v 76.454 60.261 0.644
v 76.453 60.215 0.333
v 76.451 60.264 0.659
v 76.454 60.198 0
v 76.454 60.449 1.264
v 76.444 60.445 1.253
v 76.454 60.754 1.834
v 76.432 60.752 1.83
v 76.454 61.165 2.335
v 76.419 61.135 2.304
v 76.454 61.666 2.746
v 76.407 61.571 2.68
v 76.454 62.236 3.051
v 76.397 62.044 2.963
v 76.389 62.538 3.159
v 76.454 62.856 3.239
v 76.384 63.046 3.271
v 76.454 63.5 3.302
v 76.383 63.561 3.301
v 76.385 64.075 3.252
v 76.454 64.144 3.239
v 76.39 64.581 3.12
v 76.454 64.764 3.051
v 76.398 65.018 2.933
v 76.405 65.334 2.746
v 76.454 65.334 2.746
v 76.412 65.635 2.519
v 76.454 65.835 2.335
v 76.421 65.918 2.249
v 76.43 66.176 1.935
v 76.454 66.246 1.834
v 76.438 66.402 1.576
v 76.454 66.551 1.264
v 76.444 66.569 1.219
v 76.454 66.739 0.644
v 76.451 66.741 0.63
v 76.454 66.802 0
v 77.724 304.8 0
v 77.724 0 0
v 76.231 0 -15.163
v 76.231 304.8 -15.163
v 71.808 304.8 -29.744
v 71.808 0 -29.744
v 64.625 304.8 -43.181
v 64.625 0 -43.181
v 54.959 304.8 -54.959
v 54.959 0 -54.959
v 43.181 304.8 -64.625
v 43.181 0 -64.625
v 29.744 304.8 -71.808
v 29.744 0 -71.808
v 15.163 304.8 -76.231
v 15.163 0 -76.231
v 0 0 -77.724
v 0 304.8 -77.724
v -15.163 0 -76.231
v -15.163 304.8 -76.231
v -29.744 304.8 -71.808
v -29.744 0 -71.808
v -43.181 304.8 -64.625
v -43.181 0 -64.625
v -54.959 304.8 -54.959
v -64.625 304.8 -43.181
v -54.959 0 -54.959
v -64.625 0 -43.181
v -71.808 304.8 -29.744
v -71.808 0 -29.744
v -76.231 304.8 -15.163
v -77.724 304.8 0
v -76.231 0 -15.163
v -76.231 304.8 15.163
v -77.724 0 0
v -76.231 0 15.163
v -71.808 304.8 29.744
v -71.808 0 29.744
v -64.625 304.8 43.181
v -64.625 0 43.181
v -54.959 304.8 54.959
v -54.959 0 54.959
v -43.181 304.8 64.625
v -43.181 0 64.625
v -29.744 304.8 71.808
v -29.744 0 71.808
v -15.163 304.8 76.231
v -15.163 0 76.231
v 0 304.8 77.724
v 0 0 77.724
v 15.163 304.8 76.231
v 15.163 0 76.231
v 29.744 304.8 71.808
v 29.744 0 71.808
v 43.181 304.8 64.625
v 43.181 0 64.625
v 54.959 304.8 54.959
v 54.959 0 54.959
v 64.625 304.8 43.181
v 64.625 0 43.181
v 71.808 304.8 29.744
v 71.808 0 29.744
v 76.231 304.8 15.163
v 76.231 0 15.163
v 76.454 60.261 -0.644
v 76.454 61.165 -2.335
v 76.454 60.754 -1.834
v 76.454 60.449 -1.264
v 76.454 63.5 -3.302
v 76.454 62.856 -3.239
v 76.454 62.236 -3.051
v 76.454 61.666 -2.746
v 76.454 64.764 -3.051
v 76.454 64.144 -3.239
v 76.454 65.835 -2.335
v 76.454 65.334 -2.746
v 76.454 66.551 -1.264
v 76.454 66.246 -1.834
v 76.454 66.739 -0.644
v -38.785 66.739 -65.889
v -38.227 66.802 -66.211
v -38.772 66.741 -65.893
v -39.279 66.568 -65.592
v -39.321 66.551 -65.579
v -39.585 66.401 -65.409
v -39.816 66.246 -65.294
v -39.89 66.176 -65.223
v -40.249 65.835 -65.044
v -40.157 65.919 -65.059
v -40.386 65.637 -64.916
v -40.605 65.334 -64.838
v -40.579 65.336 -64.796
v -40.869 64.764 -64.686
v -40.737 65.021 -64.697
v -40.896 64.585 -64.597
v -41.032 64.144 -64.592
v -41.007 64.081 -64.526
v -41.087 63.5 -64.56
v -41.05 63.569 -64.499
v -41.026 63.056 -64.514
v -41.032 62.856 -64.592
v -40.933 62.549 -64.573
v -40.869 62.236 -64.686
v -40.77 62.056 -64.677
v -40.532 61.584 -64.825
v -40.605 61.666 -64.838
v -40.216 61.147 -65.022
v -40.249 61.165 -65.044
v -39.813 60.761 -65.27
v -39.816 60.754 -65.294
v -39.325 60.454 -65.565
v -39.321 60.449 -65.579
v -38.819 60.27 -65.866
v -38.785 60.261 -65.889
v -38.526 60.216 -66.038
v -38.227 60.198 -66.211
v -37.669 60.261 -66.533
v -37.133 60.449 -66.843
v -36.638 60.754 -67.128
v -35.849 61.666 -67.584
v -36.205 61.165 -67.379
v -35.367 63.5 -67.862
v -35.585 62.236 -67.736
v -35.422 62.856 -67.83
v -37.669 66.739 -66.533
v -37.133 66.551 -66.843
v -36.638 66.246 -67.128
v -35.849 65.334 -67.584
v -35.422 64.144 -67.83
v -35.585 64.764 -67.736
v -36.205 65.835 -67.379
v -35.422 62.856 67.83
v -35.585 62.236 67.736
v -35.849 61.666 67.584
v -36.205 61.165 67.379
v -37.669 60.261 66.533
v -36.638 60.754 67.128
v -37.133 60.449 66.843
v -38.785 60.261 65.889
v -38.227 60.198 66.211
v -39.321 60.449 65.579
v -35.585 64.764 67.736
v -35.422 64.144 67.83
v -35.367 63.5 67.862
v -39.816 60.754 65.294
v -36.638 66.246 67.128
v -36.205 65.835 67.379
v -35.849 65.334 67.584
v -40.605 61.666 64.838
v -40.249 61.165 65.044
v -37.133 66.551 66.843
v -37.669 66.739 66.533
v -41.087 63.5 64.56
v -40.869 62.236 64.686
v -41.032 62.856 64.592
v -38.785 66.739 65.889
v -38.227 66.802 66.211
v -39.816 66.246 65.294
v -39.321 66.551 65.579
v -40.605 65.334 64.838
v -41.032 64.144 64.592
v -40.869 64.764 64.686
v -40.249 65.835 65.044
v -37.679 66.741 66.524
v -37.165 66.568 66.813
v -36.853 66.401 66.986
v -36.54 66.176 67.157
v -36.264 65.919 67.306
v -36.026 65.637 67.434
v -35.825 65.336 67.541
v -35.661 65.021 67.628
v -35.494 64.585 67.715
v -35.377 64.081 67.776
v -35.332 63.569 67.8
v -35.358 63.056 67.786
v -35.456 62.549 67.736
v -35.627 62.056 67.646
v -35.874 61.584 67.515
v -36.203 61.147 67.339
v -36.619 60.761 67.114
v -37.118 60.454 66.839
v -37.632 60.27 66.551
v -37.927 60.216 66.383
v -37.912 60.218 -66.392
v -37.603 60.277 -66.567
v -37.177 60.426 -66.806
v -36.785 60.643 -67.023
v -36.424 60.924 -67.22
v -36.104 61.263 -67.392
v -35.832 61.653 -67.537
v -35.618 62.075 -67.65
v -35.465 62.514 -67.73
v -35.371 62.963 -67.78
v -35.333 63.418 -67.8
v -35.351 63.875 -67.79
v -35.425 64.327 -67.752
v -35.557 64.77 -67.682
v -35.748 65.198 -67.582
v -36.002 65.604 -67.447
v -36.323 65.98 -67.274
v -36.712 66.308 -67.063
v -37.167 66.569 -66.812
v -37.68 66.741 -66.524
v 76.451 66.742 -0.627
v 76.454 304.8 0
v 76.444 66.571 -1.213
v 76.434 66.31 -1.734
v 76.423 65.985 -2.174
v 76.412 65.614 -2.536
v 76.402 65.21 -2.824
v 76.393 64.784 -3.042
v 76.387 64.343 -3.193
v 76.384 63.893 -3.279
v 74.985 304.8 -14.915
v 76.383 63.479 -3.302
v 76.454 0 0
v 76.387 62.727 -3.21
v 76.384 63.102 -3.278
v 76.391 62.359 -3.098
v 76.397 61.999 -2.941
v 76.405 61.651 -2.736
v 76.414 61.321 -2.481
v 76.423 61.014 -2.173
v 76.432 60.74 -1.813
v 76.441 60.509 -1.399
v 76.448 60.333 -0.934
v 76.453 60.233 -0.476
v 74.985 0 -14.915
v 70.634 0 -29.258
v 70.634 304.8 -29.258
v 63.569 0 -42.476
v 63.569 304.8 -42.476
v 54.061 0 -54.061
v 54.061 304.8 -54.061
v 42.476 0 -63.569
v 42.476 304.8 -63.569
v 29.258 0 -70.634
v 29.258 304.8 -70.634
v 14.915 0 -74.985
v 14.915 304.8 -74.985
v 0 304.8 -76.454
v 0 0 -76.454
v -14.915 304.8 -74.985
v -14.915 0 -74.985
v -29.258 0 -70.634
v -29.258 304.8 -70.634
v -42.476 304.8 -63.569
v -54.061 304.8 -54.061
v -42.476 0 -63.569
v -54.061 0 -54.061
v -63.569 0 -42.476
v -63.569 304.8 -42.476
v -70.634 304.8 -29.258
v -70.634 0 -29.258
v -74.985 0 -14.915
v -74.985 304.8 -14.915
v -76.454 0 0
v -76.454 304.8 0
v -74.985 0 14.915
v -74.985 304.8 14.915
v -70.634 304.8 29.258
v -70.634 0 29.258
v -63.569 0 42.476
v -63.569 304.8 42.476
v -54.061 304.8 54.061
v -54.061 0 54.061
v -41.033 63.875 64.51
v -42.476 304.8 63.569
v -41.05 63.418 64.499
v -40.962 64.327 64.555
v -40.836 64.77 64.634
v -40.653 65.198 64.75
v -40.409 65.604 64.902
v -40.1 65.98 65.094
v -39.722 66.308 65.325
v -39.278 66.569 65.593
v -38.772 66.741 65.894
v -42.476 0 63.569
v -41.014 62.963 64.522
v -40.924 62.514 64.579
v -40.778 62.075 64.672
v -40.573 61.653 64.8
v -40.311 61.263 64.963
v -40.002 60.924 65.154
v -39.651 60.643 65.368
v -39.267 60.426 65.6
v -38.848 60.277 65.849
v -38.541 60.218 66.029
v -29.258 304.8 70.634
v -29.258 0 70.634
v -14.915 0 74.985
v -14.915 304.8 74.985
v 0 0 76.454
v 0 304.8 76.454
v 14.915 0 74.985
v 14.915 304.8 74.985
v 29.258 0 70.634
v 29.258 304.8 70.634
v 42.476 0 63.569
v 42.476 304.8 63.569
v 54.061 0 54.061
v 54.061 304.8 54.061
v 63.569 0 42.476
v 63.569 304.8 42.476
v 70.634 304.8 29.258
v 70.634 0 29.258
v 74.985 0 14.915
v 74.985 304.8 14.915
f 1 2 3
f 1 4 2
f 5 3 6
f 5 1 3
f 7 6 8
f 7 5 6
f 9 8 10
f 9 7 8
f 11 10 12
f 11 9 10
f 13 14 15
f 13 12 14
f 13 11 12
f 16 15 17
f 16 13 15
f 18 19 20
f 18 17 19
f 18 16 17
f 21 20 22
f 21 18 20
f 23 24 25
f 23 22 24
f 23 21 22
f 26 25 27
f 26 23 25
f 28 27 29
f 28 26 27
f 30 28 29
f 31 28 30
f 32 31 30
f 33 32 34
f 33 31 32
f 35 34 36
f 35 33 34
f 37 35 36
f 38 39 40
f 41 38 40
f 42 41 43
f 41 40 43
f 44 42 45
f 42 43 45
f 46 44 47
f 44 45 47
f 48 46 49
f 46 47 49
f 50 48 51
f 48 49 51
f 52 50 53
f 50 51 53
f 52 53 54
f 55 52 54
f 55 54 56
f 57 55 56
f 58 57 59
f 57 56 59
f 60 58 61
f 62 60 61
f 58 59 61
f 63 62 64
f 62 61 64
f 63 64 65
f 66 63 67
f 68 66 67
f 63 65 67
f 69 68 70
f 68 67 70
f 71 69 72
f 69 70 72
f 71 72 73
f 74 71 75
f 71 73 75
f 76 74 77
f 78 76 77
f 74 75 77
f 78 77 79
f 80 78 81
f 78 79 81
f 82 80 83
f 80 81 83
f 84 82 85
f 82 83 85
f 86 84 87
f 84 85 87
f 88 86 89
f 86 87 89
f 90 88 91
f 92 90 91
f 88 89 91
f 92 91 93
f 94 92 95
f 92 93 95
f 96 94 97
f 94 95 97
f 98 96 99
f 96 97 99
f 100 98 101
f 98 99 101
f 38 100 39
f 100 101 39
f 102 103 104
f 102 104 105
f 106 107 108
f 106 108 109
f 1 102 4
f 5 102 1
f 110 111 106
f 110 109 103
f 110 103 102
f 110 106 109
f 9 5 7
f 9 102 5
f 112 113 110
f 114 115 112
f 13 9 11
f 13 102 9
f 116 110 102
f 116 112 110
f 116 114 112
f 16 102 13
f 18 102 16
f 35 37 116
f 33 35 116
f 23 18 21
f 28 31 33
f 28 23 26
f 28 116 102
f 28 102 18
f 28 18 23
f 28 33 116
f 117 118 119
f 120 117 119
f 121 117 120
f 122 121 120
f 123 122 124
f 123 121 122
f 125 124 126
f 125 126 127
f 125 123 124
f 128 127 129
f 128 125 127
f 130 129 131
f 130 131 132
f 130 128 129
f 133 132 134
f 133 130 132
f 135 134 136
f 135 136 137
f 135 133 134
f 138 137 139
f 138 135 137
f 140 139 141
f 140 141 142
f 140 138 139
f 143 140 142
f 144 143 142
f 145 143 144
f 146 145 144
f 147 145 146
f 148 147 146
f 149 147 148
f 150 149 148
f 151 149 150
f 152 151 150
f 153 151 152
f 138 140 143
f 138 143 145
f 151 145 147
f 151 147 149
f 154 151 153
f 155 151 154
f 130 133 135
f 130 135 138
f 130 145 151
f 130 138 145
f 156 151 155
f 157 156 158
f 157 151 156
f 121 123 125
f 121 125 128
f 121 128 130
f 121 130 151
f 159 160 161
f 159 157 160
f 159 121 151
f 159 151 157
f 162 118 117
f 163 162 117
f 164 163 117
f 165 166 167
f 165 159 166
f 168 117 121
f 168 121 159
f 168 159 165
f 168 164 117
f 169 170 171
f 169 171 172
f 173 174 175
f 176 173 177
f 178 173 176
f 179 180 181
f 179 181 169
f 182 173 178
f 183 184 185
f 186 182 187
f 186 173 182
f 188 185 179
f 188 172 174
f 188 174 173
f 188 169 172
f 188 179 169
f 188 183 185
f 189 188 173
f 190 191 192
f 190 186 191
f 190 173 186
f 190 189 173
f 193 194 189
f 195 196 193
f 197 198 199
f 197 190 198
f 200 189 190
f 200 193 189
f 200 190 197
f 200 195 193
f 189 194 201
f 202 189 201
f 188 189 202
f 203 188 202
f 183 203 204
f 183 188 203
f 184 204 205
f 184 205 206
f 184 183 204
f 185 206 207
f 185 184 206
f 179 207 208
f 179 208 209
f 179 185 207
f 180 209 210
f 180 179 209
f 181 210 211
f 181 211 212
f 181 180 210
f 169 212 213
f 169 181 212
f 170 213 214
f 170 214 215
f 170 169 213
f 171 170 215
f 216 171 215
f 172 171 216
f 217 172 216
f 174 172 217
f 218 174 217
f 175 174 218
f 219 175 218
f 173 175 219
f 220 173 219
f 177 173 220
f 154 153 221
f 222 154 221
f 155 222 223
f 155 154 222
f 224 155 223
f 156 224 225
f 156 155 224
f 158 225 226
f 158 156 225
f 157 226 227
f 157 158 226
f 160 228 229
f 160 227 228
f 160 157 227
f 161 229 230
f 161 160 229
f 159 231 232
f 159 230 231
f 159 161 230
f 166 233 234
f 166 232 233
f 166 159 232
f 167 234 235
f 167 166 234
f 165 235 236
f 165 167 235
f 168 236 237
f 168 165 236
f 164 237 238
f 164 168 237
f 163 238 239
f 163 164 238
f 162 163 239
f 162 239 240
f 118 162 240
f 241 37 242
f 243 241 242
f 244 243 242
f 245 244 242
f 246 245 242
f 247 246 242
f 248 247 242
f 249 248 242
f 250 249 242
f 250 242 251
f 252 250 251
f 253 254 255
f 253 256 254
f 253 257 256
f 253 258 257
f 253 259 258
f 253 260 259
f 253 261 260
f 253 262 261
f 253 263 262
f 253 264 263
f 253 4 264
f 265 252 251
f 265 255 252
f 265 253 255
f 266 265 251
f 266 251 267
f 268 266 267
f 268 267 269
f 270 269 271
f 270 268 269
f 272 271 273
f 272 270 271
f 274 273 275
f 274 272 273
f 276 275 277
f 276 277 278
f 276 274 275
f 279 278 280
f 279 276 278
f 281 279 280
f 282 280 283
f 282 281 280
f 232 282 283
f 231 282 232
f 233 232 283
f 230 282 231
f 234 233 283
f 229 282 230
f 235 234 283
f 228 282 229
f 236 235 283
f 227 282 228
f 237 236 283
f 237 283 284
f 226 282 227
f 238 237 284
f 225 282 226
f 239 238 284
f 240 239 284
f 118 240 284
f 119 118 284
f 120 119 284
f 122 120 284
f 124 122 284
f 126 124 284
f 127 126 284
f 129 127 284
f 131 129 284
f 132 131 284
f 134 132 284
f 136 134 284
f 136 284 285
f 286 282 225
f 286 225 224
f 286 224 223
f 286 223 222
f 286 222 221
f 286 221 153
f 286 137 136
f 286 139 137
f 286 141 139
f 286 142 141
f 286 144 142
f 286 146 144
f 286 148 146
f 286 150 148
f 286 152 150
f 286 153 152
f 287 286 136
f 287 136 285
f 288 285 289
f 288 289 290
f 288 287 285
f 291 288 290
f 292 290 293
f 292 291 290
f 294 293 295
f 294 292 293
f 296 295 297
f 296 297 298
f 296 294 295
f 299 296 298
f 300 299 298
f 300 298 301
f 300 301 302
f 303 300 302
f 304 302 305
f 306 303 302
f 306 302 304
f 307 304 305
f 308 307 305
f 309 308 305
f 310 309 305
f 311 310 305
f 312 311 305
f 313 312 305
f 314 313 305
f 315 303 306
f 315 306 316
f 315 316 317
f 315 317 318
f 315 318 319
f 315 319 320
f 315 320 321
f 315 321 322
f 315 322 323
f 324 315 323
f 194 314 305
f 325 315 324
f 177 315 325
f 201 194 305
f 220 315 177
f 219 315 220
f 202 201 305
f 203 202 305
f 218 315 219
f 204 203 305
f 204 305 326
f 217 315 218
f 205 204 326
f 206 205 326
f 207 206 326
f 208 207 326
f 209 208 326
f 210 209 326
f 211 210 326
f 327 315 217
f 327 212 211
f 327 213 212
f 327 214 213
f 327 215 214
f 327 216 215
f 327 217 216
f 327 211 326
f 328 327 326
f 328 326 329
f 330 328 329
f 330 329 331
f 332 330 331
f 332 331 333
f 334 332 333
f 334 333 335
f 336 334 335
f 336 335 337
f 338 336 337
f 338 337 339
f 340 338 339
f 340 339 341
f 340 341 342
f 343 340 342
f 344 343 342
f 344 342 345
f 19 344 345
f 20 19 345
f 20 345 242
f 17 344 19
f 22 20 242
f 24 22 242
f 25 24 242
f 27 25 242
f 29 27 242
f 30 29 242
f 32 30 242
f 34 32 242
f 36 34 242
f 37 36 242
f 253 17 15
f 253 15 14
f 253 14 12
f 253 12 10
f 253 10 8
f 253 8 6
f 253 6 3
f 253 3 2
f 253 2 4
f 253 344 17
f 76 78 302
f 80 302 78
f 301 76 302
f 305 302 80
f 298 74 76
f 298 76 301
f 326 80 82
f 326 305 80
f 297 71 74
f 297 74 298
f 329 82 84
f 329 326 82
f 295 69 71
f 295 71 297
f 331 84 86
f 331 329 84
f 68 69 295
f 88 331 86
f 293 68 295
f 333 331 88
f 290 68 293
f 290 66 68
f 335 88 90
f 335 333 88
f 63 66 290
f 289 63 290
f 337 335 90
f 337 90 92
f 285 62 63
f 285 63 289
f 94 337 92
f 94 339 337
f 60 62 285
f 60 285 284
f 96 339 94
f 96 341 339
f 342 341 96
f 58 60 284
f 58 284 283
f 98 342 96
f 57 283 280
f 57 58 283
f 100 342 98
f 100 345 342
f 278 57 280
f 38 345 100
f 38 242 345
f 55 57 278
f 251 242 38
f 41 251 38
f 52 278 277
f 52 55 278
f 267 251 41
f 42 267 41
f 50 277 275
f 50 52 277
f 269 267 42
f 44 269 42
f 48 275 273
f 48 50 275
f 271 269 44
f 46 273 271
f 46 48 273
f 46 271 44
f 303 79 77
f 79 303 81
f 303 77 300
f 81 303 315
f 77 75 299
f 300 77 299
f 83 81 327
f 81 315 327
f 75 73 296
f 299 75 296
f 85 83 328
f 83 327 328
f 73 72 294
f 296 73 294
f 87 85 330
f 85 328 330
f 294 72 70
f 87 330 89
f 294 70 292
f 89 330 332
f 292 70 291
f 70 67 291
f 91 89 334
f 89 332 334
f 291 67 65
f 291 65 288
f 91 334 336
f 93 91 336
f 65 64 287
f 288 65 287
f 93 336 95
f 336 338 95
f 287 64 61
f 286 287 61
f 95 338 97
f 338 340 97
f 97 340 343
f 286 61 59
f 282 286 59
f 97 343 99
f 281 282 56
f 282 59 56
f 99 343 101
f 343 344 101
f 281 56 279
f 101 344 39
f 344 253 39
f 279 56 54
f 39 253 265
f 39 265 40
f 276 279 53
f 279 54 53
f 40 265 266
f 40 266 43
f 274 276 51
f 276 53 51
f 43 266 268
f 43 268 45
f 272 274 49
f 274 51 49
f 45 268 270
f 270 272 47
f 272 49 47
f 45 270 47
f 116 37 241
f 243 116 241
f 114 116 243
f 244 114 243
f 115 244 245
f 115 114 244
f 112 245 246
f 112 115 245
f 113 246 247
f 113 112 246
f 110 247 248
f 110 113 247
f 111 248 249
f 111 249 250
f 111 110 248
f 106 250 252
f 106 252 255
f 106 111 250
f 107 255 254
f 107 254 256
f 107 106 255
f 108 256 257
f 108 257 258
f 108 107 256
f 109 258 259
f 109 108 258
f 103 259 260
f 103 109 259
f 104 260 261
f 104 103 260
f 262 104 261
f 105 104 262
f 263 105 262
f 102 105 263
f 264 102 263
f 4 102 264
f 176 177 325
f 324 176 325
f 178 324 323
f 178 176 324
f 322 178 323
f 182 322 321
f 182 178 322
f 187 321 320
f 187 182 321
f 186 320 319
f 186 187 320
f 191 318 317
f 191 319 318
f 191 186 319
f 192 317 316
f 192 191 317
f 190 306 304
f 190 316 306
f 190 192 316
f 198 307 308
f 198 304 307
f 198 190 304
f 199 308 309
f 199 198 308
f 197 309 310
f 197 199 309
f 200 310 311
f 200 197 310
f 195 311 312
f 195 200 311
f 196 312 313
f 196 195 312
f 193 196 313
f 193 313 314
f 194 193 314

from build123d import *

# Parameters (mm, degrees)
SKETCH1_R           = 77.724
SKETCH1_R_2         = 76.454
EXTRUDE_THIN2_DEPTH = 304.8
SKETCH3_R           = 3.302
CUT_EXTRUDE2_DEPTH  = 2.54
CIRPATTERN2_COUNT   = 3


with BuildPart() as part:
    # Sketch1 → Extrude-Thin2 (new body)
    with BuildSketch(Plane(origin=(0, 0, 0), x_dir=(1, 0, 0), z_dir=(0, 1, 0))):
        Circle(SKETCH1_R)
        Circle(SKETCH1_R_2, mode=Mode.SUBTRACT)
    extrude(amount=EXTRUDE_THIN2_DEPTH)

    # Sketch3 → Cut-Extrude2 (cut)
    with BuildSketch(Plane.ZY.offset(-76.454)):
        with Locations((0, 63.5)):
            Circle(SKETCH3_R)
    cut_extrude2 = extrude(amount=CUT_EXTRUDE2_DEPTH, mode=Mode.SUBTRACT)

    # CirPattern2: Cut-Extrude2 ×3 about axis
    cirpattern2_axis = Axis((0, 0, 0), (0, 1, 0))
    for i in range(1, CIRPATTERN2_COUNT):
        add(cut_extrude2.rotate(cirpattern2_axis, i * 360 / CIRPATTERN2_COUNT), mode=Mode.SUBTRACT)


solid = part.part
